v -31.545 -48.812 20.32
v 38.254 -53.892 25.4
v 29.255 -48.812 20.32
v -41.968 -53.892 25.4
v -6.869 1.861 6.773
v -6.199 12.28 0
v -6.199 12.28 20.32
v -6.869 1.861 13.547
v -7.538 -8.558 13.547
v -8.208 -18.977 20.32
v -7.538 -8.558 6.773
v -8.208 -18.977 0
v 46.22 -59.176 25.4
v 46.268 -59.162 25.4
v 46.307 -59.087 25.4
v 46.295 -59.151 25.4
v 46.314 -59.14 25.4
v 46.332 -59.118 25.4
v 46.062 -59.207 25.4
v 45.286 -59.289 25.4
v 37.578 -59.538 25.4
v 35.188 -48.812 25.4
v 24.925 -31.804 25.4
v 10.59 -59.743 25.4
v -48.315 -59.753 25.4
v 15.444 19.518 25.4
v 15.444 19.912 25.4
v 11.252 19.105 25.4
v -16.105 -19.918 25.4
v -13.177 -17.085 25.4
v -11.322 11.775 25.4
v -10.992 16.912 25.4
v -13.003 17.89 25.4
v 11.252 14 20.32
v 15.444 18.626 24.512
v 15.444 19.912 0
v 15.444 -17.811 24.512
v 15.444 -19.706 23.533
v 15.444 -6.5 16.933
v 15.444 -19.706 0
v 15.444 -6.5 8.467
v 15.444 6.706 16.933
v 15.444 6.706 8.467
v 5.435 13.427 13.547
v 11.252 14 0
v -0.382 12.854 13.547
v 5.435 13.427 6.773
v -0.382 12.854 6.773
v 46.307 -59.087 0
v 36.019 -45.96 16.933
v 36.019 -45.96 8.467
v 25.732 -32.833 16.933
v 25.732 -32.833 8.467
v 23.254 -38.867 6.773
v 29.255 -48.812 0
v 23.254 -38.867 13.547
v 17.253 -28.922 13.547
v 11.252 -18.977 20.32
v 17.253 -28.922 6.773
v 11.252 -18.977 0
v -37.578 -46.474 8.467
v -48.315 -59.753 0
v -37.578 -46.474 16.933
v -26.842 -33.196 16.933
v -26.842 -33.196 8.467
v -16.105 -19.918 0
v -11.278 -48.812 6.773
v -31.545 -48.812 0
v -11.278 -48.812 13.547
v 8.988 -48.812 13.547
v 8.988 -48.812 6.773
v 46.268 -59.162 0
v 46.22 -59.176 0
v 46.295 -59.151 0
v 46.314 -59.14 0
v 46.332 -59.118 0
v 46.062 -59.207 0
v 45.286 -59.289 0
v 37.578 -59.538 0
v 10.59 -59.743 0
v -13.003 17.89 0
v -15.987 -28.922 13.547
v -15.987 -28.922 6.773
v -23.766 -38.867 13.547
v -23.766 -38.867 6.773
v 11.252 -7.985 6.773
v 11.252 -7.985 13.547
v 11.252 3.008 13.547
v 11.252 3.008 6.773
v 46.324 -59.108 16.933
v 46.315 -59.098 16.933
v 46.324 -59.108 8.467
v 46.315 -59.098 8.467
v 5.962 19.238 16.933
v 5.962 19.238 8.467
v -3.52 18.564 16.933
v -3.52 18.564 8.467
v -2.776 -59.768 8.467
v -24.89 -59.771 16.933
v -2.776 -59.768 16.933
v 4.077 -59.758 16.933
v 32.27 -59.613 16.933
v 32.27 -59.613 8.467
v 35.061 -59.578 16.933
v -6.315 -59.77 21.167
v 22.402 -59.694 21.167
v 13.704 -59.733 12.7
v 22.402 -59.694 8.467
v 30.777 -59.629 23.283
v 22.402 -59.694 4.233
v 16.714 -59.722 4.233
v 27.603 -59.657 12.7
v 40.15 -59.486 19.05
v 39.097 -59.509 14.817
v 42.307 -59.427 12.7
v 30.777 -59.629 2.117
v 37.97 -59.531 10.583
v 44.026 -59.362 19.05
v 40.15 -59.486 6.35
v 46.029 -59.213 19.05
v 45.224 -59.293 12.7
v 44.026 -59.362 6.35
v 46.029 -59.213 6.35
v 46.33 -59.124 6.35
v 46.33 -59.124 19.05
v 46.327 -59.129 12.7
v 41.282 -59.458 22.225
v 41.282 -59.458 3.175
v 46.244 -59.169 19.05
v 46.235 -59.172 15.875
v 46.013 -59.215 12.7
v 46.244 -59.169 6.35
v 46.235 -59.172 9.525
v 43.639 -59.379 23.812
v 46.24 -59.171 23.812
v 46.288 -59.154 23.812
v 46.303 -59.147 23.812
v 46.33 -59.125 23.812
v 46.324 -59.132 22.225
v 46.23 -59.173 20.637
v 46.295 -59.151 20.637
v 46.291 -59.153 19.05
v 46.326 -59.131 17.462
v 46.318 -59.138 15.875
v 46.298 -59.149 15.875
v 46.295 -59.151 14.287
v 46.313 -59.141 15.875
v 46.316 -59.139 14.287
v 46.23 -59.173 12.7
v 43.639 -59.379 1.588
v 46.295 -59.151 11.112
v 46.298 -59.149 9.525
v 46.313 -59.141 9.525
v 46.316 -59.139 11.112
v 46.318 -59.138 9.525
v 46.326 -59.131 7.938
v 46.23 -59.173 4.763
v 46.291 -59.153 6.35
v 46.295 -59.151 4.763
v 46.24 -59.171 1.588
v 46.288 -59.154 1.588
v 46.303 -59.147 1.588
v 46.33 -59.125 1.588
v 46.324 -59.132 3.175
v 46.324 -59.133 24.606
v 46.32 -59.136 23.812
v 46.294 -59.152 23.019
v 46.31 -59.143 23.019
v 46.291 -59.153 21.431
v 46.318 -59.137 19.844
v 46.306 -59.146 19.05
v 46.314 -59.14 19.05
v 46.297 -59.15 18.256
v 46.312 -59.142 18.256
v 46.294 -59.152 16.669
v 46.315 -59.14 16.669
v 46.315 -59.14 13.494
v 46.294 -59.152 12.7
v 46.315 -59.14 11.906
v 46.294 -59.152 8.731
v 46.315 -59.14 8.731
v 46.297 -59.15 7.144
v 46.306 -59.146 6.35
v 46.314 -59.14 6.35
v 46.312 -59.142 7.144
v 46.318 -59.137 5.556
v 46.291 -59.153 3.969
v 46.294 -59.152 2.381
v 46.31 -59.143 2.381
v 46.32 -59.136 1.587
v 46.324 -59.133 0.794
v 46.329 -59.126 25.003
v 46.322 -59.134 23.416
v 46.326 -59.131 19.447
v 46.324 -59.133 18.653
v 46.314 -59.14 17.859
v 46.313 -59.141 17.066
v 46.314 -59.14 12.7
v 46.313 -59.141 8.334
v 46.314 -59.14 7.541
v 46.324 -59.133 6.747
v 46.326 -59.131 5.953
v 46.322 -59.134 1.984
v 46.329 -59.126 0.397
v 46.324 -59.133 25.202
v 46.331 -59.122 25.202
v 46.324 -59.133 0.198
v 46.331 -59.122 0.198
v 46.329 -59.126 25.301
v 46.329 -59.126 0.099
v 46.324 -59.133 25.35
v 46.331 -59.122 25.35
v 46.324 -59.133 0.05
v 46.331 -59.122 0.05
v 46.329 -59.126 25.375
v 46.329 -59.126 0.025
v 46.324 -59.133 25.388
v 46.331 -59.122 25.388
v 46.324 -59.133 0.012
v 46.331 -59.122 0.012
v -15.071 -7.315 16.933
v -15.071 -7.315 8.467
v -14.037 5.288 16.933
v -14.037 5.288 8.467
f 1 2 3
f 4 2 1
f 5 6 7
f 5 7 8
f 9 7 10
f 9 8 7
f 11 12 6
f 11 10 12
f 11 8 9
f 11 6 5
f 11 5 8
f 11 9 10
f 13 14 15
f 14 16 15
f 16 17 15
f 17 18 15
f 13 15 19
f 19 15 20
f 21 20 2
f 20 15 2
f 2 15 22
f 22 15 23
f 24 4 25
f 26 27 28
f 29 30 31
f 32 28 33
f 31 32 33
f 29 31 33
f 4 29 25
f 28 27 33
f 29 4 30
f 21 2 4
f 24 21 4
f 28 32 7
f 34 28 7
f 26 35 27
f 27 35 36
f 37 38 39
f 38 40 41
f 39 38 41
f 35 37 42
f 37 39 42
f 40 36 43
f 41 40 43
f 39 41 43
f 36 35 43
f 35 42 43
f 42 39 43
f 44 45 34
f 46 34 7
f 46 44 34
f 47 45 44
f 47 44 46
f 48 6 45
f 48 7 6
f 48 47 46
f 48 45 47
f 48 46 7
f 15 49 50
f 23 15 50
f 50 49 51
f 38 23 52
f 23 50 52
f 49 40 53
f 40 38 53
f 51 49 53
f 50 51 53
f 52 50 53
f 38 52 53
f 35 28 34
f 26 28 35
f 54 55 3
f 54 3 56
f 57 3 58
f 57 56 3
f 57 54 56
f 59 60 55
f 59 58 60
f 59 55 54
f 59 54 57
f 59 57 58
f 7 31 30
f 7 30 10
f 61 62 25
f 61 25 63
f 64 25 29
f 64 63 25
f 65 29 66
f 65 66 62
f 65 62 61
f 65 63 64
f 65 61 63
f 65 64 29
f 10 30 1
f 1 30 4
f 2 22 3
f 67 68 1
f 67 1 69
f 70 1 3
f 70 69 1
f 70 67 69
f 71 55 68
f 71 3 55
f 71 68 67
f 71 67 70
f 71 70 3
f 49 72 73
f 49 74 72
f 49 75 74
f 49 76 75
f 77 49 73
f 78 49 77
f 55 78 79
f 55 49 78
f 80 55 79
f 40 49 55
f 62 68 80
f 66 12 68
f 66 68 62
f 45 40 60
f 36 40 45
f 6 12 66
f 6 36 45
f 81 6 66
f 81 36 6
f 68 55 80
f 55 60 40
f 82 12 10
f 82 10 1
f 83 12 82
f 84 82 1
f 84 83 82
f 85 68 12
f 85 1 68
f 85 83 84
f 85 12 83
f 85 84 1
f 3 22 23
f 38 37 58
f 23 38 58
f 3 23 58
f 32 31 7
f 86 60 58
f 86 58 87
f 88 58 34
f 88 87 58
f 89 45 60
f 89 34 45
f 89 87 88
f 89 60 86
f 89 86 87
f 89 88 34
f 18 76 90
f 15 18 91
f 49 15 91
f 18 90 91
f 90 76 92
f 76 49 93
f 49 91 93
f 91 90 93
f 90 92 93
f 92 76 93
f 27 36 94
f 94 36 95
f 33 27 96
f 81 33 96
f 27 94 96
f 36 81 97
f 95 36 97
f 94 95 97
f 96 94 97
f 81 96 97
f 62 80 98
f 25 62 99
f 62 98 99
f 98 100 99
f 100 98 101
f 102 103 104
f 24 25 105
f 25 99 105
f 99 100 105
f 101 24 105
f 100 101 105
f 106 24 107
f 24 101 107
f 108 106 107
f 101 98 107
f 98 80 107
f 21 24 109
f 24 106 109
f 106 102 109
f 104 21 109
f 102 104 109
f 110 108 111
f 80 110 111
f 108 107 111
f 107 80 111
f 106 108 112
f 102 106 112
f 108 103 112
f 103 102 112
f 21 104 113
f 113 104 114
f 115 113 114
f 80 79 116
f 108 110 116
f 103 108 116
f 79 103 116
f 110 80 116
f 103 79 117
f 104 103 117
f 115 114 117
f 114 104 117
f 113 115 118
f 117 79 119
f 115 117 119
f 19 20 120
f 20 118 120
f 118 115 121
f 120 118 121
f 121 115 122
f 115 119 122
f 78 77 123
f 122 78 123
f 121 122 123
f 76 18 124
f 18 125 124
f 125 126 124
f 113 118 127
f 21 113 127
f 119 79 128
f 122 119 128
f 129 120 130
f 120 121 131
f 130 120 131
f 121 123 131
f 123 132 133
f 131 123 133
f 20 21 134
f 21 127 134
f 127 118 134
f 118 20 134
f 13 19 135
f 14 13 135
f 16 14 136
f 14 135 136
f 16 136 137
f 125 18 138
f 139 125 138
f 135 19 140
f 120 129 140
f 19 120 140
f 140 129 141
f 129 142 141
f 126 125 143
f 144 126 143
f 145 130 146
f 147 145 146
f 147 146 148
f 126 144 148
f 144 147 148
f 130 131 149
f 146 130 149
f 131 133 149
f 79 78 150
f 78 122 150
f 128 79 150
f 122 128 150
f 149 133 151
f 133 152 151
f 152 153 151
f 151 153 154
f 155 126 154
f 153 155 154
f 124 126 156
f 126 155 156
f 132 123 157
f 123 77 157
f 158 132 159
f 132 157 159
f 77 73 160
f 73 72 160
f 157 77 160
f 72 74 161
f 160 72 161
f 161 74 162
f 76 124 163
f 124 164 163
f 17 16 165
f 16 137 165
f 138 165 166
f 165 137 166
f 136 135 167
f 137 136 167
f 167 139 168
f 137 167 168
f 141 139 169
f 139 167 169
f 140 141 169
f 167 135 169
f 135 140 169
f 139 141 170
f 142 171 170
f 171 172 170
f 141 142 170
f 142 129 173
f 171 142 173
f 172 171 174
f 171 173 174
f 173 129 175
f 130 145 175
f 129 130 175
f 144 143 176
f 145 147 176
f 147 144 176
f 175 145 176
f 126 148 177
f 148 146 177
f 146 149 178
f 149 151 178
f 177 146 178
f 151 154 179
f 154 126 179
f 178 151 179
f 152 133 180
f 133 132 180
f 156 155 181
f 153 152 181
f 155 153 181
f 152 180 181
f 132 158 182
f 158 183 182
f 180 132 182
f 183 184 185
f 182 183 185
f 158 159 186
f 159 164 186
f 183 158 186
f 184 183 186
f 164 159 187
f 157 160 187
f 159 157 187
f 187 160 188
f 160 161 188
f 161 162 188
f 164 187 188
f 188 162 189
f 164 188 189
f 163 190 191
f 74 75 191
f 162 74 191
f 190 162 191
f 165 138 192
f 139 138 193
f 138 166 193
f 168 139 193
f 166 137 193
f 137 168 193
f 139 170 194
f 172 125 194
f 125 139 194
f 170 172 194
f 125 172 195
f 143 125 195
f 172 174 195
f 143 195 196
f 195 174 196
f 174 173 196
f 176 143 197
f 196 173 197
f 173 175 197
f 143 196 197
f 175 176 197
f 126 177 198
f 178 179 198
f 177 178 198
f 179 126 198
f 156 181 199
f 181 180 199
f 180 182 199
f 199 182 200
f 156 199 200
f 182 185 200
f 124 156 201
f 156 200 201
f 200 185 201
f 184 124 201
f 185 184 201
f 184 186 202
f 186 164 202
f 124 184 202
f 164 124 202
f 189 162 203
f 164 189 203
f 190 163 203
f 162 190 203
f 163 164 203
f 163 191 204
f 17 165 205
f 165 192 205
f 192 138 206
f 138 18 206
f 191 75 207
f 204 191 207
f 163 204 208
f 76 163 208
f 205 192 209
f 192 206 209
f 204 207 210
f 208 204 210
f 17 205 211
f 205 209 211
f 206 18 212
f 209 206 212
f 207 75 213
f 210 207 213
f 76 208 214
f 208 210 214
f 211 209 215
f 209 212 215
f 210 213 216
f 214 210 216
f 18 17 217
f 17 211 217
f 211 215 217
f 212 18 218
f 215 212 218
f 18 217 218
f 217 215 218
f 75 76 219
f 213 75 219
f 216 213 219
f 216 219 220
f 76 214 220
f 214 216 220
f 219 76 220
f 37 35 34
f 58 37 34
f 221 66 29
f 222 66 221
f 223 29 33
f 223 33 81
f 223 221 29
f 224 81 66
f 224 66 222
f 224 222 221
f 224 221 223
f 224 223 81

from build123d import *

# Parameters (mm, degrees)
F1_DEPTH     = 25.4
F3_DEPTH     = 50.8
F5_T4_DEPTH  = 64.0057067986
F5_T9_DEPTH  = 86.9283653755
F5_T15_DEPTH = 60.9737188004
F5_T20_DEPTH = 59.1061688919
F5_T25_DEPTH = 43.6640606018
F5_T31_DEPTH = 57.4502846001


# Not quite as in the source:
# - a fillet or chamfer that OpenCascade refuses, or shapes differently, is made with other operations: its cross-section is extruded or revolved along the edge and cut away or added
# - a feature of the source that left no trace in its solid (it failed there, or was rolled back) is left out


with BuildPart() as f1:
    # F0 (on Top) → F1 (new body)
    with BuildSketch(Plane.XY):
        with BuildLine():
            add(Edge.make_bspline(
                [(-48.315115273, -59.7526505589), (-37.5784229901, -46.4742837681), (-26.8417307072, -33.1959169772), (-16.1050384243, -19.9175501863)],
                knots=[0, 0, 0, 0, 51.2281589782, 51.2281589782, 51.2281589782, 51.2281589782], degree=3))
            add(Edge.make_bspline(
                [(-48.315115273, -59.7526505589), (-1.0274761031, -59.7958142001), (46.2601630669, -59.8389778412), (46.3316738605, -59.1182820499)],
                knots=[0, 0, 0, 0, 0.8911107377, 0.8911107377, 0.8911107377, 0.8911107377], degree=3))
            add(Edge.make_bspline(
                [(46.3316738605, -59.1182820499), (46.3235373894, -59.1079000767), (46.3154009182, -59.0975181035), (46.3072644471, -59.0871361303)],
                knots=[0, 0, 0, 0, 0.0395712999, 0.0395712999, 0.0395712999, 0.0395712999], degree=3))
            add(Edge.make_bspline(
                [(46.3072644471, -59.0871361303), (36.0194733937, -45.9601220924), (25.7316823403, -32.8331080545), (15.4438912868, -19.7060940166)],
                knots=[0.0395712999, 0.0395712999, 0.0395712999, 0.0395712999, 50.0737024584, 50.0737024584, 50.0737024584, 50.0737024584], degree=3))
            add(Edge.make_bspline(
                [(15.4438912868, -19.7060940166), (10.2959275246, -13.1373960111), (5.1479637623, -6.5686980055), (0, 0)],
                knots=[50.0737024584, 50.0737024584, 50.0737024584, 50.0737024584, 75.1105536876, 75.1105536876, 75.1105536876, 75.1105536876], degree=3))
            add(Edge.make_bspline(
                [(-16.1050384243, -19.9175501863), (-10.7366922829, -13.2783667909), (-5.3683461414, -6.6391833954), (0, 0)],
                knots=[51.2281589782, 51.2281589782, 51.2281589782, 51.2281589782, 76.8422384673, 76.8422384673, 76.8422384673, 76.8422384673], degree=3))
        make_face()
        with BuildLine():
            add(Edge.make_bspline(
                [(-16.1050384243, -19.9175501863), (-15.0708617229, -7.3149574714), (-14.0366850214, 5.2876352436), (-13.0025083199, 17.8902279586)],
                knots=[0, 0, 0, 0, 37.9348623472, 37.9348623472, 37.9348623472, 37.9348623472], degree=3))
            add(Edge.make_bspline(
                [(-16.1050384243, -19.9175501863), (-10.7366922829, -13.2783667909), (-5.3683461414, -6.6391833954), (0, 0)],
                knots=[51.2281589782, 51.2281589782, 51.2281589782, 51.2281589782, 76.8422384673, 76.8422384673, 76.8422384673, 76.8422384673], degree=3))
            add(Edge.make_bspline(
                [(15.4438912868, -19.7060940166), (10.2959275246, -13.1373960111), (5.1479637623, -6.5686980055), (0, 0)],
                knots=[50.0737024584, 50.0737024584, 50.0737024584, 50.0737024584, 75.1105536876, 75.1105536876, 75.1105536876, 75.1105536876], degree=3))
            add(Edge.make_bspline(
                [(15.4438912868, -19.7060940166), (15.4438912868, -6.5000866436), (15.4438912868, 6.7059207294), (15.4438912868, 19.9119281024)],
                knots=[0, 0, 0, 0, 39.618022119, 39.618022119, 39.618022119, 39.618022119], degree=3))
            add(Edge.make_bspline(
                [(15.4438912868, 19.9119281024), (5.9617580846, 19.2380280544), (-3.5203751177, 18.5641280065), (-13.0025083199, 17.8902279586)],
                knots=[0, 0, 0, 0, 28.5181507475, 28.5181507475, 28.5181507475, 28.5181507475], degree=3))
        make_face()
    extrude(amount=F1_DEPTH)

    # F2 (on Top) → F3 (cut)
    with BuildSketch(Plane.XY):
        with BuildLine():
            add(Edge.make_bspline(
                [(11.2517978996, 14.0004176646), (5.4347412661, 13.426968207), (-0.3823153675, 12.8535187493), (-6.199372001, 12.2800692916)],
                knots=[0, 0, 0, 0, 17.5357614441, 17.5357614441, 17.5357614441, 17.5357614441], degree=3))
            add(Edge.make_bspline(
                [(-6.199372001, 12.2800692916), (-6.8688768273, 1.8608955046), (-7.5383816535, -8.5582782825), (-8.2078864798, -18.9774520695)],
                knots=[0, 0, 0, 0, 31.3219854424, 31.3219854424, 31.3219854424, 31.3219854424], degree=3))
            add(Edge.make_bspline(
                [(-8.2078864798, -18.9774520695), (-15.9868902216, -28.9221989612), (-23.7658939635, -38.8669458528), (-31.5448977053, -48.8116927445)],
                knots=[0, 0, 0, 0, 37.8774076409, 37.8774076409, 37.8774076409, 37.8774076409], degree=3))
            add(Edge.make_bspline(
                [(-31.5448977053, -48.8116927445), (-14.2238239447, -48.8116927445), (3.0972498159, -48.8116927445), (20.4183235765, -48.8116927445)],
                knots=[0, 0, 0, 0, 51.9632212818, 51.9632212818, 51.9632212818, 51.9632212818], degree=3))
            add(Edge.make_bspline(
                [(20.4183235765, -48.8116927445), (23.3639385551, -48.8116927445), (26.3095535338, -48.8116927445), (29.2551685125, -48.8116927445)],
                knots=[0, 0, 0, 0, 8.836844936, 8.836844936, 8.836844936, 8.836844936], degree=3))
            add(Edge.make_bspline(
                [(29.2551685125, -48.8116927445), (23.2540449748, -38.8669458528), (17.2529214372, -28.9221989612), (11.2517978996, -18.9774520695)],
                knots=[0, 0, 0, 0, 34.8454196427, 34.8454196427, 34.8454196427, 34.8454196427], degree=3))
            add(Edge.make_bspline(
                [(11.2517978996, -18.9774520695), (11.2517978996, -7.9848288248), (11.2517978996, 3.0077944199), (11.2517978996, 14.0004176646)],
                knots=[0, 0, 0, 0, 32.9778697342, 32.9778697342, 32.9778697342, 32.9778697342], degree=3))
        make_face()
    extrude(amount=F3_DEPTH, mode=Mode.SUBTRACT)

    # F5: chamfer of 5.08 on 6 edges, made by hand


with BuildPart() as f5_tool2:
    # F5_s3 → F5_t4 (new body)
    with BuildSketch(Plane(origin=(-43.7113633895, -55.8809919142, 0), x_dir=(0, 0, 1), z_dir=(0.6161195467, 0.7876526545, 0))):
        Polygon((25.4, 0.1474155925), (20.32, 5.2274155925), (25.4, 5.2274155925), align=None)
    extrude(amount=F5_T4_DEPTH)

    split(bisect_by=Plane(origin=(0, -14.2458463722, -14.2458463722), x_dir=(1, 0, 0), z_dir=(0, 0.7071067812, 0.7071067812)), keep=Keep.TOP)


with BuildPart() as f1_1:
    add(f1.part)

    # F5_t1: cut F5_tool2
    add(f5_tool2.part, mode=Mode.SUBTRACT)


with BuildPart() as f5_tool7:
    # F5_s8 → F5_t9 (new body)
    with BuildSketch(Plane.YZ.offset(-44.6090472842)):
        Polygon((-53.8916927445, 25.4), (-48.8116927445, 20.32), (-48.8116927445, 25.4), align=None)
    extrude(amount=F5_T9_DEPTH)

    split(bisect_by=Plane(origin=(-8.7722085747, -5.293559296, 10.2456533856), x_dir=(0.5166639058, -0.856188302, 0), z_dir=(-0.6054165543, -0.3653365514, 0.7071067812)), keep=Keep.TOP)

    split(bisect_by=Plane(origin=(10.0612448539, -7.870131057, 12.7737077963), x_dir=(0.6161195467, 0.7876526545, 0), z_dir=(0.5569545332, -0.4356623095, 0.7071067812)), keep=Keep.TOP)


with BuildPart() as f1_2:
    add(f1_1.part)

    # F5_t6: cut F5_tool7
    add(f5_tool7.part, mode=Mode.SUBTRACT)


with BuildPart() as f5_tool13:
    # F5_s14 → F5_t15 (new body)
    with BuildSketch(Plane(origin=(4.6486942055, -7.7035719995, 0), x_dir=(0, 0, 1), z_dir=(0.5166639058, -0.856188302, 0))):
        Polygon((25.4, -4.9086932287), (20.32, 0.1713067713), (25.4, 0.1713067713), align=None)
    extrude(amount=F5_T15_DEPTH)

    split(bisect_by=Plane(origin=(0, -14.2458463722, -14.2458463722), x_dir=(1, 0, 0), z_dir=(0, 0.7071067812, 0.7071067812)), keep=Keep.TOP)


with BuildPart() as f1_3:
    add(f1_2.part)

    # F5_t12: cut F5_tool13
    add(f5_tool13.part, mode=Mode.SUBTRACT)


with BuildPart() as f5_tool18:
    # F5_s19 → F5_t20 (new body)
    with BuildSketch(Plane.XZ.offset(-27.0645672435)):
        Polygon((16.3317978996, 25.4), (11.2517978996, 20.32), (11.2517978996, 25.4), align=None)
    extrude(amount=F5_T20_DEPTH)

    split(bisect_by=Plane(origin=(0.3674517714, -3.7274213716, 3.7454894054), x_dir=(0.9951760553, 0.0981051424, 0), z_dir=(0.0693708114, -0.7036957372, 0.7071067812)), keep=Keep.TOP)


with BuildPart() as f1_4:
    add(f1_3.part)

    # F5_t17: cut F5_tool18
    add(f5_tool18.part, mode=Mode.SUBTRACT)


with BuildPart() as f5_tool23:
    # F5_s24 → F5_t25 (new body)
    with BuildSketch(Plane(origin=(-17.9419078945, -1.7687256632, 0), x_dir=(0, 0, 1), z_dir=(0.9951760553, 0.0981051424, 0))):
        Polygon((25.4, -17.9090211892), (20.32, -12.8290211892), (25.4, -12.8290211892), align=None)
    extrude(amount=F5_T25_DEPTH)

    split(bisect_by=Plane(origin=(6.6592316135, -0.4279022306, 6.672965308), x_dir=(0.0641247498, 0.9979418903, 0), z_dir=(0.7056514779, -0.0453430454, 0.7071067812)), keep=Keep.TOP)

    split(bisect_by=Plane(origin=(-4.5341010502, 0, 4.5341010502), x_dir=(0, 1, 0), z_dir=(-0.7071067812, 0, 0.7071067812)), keep=Keep.TOP)


with BuildPart() as f1_5:
    add(f1_4.part)

    # F5_t22: cut F5_tool23
    add(f5_tool23.part, mode=Mode.SUBTRACT)


with BuildPart() as f5_tool29:
    # F5_s30 → F5_t31 (new body)
    with BuildSketch(Plane(origin=(-2.0859058182, -32.4619246499, 0), x_dir=(0, 0, 1), z_dir=(0.0641247498, 0.9979418903, 0))):
        Polygon((25.4, -12.054069384), (20.32, -6.974069384), (25.4, -6.974069384), align=None)
    extrude(amount=F5_T31_DEPTH)

    split(bisect_by=Plane(origin=(0.3674517714, -3.7274213716, 3.7454894054), x_dir=(0.9951760553, 0.0981051424, 0), z_dir=(0.0693708114, -0.7036957372, 0.7071067812)), keep=Keep.TOP)


with BuildPart() as f1_6:
    add(f1_5.part)

    # F5_t28: cut F5_tool29
    add(f5_tool29.part, mode=Mode.SUBTRACT)


solid = f1_6.part
